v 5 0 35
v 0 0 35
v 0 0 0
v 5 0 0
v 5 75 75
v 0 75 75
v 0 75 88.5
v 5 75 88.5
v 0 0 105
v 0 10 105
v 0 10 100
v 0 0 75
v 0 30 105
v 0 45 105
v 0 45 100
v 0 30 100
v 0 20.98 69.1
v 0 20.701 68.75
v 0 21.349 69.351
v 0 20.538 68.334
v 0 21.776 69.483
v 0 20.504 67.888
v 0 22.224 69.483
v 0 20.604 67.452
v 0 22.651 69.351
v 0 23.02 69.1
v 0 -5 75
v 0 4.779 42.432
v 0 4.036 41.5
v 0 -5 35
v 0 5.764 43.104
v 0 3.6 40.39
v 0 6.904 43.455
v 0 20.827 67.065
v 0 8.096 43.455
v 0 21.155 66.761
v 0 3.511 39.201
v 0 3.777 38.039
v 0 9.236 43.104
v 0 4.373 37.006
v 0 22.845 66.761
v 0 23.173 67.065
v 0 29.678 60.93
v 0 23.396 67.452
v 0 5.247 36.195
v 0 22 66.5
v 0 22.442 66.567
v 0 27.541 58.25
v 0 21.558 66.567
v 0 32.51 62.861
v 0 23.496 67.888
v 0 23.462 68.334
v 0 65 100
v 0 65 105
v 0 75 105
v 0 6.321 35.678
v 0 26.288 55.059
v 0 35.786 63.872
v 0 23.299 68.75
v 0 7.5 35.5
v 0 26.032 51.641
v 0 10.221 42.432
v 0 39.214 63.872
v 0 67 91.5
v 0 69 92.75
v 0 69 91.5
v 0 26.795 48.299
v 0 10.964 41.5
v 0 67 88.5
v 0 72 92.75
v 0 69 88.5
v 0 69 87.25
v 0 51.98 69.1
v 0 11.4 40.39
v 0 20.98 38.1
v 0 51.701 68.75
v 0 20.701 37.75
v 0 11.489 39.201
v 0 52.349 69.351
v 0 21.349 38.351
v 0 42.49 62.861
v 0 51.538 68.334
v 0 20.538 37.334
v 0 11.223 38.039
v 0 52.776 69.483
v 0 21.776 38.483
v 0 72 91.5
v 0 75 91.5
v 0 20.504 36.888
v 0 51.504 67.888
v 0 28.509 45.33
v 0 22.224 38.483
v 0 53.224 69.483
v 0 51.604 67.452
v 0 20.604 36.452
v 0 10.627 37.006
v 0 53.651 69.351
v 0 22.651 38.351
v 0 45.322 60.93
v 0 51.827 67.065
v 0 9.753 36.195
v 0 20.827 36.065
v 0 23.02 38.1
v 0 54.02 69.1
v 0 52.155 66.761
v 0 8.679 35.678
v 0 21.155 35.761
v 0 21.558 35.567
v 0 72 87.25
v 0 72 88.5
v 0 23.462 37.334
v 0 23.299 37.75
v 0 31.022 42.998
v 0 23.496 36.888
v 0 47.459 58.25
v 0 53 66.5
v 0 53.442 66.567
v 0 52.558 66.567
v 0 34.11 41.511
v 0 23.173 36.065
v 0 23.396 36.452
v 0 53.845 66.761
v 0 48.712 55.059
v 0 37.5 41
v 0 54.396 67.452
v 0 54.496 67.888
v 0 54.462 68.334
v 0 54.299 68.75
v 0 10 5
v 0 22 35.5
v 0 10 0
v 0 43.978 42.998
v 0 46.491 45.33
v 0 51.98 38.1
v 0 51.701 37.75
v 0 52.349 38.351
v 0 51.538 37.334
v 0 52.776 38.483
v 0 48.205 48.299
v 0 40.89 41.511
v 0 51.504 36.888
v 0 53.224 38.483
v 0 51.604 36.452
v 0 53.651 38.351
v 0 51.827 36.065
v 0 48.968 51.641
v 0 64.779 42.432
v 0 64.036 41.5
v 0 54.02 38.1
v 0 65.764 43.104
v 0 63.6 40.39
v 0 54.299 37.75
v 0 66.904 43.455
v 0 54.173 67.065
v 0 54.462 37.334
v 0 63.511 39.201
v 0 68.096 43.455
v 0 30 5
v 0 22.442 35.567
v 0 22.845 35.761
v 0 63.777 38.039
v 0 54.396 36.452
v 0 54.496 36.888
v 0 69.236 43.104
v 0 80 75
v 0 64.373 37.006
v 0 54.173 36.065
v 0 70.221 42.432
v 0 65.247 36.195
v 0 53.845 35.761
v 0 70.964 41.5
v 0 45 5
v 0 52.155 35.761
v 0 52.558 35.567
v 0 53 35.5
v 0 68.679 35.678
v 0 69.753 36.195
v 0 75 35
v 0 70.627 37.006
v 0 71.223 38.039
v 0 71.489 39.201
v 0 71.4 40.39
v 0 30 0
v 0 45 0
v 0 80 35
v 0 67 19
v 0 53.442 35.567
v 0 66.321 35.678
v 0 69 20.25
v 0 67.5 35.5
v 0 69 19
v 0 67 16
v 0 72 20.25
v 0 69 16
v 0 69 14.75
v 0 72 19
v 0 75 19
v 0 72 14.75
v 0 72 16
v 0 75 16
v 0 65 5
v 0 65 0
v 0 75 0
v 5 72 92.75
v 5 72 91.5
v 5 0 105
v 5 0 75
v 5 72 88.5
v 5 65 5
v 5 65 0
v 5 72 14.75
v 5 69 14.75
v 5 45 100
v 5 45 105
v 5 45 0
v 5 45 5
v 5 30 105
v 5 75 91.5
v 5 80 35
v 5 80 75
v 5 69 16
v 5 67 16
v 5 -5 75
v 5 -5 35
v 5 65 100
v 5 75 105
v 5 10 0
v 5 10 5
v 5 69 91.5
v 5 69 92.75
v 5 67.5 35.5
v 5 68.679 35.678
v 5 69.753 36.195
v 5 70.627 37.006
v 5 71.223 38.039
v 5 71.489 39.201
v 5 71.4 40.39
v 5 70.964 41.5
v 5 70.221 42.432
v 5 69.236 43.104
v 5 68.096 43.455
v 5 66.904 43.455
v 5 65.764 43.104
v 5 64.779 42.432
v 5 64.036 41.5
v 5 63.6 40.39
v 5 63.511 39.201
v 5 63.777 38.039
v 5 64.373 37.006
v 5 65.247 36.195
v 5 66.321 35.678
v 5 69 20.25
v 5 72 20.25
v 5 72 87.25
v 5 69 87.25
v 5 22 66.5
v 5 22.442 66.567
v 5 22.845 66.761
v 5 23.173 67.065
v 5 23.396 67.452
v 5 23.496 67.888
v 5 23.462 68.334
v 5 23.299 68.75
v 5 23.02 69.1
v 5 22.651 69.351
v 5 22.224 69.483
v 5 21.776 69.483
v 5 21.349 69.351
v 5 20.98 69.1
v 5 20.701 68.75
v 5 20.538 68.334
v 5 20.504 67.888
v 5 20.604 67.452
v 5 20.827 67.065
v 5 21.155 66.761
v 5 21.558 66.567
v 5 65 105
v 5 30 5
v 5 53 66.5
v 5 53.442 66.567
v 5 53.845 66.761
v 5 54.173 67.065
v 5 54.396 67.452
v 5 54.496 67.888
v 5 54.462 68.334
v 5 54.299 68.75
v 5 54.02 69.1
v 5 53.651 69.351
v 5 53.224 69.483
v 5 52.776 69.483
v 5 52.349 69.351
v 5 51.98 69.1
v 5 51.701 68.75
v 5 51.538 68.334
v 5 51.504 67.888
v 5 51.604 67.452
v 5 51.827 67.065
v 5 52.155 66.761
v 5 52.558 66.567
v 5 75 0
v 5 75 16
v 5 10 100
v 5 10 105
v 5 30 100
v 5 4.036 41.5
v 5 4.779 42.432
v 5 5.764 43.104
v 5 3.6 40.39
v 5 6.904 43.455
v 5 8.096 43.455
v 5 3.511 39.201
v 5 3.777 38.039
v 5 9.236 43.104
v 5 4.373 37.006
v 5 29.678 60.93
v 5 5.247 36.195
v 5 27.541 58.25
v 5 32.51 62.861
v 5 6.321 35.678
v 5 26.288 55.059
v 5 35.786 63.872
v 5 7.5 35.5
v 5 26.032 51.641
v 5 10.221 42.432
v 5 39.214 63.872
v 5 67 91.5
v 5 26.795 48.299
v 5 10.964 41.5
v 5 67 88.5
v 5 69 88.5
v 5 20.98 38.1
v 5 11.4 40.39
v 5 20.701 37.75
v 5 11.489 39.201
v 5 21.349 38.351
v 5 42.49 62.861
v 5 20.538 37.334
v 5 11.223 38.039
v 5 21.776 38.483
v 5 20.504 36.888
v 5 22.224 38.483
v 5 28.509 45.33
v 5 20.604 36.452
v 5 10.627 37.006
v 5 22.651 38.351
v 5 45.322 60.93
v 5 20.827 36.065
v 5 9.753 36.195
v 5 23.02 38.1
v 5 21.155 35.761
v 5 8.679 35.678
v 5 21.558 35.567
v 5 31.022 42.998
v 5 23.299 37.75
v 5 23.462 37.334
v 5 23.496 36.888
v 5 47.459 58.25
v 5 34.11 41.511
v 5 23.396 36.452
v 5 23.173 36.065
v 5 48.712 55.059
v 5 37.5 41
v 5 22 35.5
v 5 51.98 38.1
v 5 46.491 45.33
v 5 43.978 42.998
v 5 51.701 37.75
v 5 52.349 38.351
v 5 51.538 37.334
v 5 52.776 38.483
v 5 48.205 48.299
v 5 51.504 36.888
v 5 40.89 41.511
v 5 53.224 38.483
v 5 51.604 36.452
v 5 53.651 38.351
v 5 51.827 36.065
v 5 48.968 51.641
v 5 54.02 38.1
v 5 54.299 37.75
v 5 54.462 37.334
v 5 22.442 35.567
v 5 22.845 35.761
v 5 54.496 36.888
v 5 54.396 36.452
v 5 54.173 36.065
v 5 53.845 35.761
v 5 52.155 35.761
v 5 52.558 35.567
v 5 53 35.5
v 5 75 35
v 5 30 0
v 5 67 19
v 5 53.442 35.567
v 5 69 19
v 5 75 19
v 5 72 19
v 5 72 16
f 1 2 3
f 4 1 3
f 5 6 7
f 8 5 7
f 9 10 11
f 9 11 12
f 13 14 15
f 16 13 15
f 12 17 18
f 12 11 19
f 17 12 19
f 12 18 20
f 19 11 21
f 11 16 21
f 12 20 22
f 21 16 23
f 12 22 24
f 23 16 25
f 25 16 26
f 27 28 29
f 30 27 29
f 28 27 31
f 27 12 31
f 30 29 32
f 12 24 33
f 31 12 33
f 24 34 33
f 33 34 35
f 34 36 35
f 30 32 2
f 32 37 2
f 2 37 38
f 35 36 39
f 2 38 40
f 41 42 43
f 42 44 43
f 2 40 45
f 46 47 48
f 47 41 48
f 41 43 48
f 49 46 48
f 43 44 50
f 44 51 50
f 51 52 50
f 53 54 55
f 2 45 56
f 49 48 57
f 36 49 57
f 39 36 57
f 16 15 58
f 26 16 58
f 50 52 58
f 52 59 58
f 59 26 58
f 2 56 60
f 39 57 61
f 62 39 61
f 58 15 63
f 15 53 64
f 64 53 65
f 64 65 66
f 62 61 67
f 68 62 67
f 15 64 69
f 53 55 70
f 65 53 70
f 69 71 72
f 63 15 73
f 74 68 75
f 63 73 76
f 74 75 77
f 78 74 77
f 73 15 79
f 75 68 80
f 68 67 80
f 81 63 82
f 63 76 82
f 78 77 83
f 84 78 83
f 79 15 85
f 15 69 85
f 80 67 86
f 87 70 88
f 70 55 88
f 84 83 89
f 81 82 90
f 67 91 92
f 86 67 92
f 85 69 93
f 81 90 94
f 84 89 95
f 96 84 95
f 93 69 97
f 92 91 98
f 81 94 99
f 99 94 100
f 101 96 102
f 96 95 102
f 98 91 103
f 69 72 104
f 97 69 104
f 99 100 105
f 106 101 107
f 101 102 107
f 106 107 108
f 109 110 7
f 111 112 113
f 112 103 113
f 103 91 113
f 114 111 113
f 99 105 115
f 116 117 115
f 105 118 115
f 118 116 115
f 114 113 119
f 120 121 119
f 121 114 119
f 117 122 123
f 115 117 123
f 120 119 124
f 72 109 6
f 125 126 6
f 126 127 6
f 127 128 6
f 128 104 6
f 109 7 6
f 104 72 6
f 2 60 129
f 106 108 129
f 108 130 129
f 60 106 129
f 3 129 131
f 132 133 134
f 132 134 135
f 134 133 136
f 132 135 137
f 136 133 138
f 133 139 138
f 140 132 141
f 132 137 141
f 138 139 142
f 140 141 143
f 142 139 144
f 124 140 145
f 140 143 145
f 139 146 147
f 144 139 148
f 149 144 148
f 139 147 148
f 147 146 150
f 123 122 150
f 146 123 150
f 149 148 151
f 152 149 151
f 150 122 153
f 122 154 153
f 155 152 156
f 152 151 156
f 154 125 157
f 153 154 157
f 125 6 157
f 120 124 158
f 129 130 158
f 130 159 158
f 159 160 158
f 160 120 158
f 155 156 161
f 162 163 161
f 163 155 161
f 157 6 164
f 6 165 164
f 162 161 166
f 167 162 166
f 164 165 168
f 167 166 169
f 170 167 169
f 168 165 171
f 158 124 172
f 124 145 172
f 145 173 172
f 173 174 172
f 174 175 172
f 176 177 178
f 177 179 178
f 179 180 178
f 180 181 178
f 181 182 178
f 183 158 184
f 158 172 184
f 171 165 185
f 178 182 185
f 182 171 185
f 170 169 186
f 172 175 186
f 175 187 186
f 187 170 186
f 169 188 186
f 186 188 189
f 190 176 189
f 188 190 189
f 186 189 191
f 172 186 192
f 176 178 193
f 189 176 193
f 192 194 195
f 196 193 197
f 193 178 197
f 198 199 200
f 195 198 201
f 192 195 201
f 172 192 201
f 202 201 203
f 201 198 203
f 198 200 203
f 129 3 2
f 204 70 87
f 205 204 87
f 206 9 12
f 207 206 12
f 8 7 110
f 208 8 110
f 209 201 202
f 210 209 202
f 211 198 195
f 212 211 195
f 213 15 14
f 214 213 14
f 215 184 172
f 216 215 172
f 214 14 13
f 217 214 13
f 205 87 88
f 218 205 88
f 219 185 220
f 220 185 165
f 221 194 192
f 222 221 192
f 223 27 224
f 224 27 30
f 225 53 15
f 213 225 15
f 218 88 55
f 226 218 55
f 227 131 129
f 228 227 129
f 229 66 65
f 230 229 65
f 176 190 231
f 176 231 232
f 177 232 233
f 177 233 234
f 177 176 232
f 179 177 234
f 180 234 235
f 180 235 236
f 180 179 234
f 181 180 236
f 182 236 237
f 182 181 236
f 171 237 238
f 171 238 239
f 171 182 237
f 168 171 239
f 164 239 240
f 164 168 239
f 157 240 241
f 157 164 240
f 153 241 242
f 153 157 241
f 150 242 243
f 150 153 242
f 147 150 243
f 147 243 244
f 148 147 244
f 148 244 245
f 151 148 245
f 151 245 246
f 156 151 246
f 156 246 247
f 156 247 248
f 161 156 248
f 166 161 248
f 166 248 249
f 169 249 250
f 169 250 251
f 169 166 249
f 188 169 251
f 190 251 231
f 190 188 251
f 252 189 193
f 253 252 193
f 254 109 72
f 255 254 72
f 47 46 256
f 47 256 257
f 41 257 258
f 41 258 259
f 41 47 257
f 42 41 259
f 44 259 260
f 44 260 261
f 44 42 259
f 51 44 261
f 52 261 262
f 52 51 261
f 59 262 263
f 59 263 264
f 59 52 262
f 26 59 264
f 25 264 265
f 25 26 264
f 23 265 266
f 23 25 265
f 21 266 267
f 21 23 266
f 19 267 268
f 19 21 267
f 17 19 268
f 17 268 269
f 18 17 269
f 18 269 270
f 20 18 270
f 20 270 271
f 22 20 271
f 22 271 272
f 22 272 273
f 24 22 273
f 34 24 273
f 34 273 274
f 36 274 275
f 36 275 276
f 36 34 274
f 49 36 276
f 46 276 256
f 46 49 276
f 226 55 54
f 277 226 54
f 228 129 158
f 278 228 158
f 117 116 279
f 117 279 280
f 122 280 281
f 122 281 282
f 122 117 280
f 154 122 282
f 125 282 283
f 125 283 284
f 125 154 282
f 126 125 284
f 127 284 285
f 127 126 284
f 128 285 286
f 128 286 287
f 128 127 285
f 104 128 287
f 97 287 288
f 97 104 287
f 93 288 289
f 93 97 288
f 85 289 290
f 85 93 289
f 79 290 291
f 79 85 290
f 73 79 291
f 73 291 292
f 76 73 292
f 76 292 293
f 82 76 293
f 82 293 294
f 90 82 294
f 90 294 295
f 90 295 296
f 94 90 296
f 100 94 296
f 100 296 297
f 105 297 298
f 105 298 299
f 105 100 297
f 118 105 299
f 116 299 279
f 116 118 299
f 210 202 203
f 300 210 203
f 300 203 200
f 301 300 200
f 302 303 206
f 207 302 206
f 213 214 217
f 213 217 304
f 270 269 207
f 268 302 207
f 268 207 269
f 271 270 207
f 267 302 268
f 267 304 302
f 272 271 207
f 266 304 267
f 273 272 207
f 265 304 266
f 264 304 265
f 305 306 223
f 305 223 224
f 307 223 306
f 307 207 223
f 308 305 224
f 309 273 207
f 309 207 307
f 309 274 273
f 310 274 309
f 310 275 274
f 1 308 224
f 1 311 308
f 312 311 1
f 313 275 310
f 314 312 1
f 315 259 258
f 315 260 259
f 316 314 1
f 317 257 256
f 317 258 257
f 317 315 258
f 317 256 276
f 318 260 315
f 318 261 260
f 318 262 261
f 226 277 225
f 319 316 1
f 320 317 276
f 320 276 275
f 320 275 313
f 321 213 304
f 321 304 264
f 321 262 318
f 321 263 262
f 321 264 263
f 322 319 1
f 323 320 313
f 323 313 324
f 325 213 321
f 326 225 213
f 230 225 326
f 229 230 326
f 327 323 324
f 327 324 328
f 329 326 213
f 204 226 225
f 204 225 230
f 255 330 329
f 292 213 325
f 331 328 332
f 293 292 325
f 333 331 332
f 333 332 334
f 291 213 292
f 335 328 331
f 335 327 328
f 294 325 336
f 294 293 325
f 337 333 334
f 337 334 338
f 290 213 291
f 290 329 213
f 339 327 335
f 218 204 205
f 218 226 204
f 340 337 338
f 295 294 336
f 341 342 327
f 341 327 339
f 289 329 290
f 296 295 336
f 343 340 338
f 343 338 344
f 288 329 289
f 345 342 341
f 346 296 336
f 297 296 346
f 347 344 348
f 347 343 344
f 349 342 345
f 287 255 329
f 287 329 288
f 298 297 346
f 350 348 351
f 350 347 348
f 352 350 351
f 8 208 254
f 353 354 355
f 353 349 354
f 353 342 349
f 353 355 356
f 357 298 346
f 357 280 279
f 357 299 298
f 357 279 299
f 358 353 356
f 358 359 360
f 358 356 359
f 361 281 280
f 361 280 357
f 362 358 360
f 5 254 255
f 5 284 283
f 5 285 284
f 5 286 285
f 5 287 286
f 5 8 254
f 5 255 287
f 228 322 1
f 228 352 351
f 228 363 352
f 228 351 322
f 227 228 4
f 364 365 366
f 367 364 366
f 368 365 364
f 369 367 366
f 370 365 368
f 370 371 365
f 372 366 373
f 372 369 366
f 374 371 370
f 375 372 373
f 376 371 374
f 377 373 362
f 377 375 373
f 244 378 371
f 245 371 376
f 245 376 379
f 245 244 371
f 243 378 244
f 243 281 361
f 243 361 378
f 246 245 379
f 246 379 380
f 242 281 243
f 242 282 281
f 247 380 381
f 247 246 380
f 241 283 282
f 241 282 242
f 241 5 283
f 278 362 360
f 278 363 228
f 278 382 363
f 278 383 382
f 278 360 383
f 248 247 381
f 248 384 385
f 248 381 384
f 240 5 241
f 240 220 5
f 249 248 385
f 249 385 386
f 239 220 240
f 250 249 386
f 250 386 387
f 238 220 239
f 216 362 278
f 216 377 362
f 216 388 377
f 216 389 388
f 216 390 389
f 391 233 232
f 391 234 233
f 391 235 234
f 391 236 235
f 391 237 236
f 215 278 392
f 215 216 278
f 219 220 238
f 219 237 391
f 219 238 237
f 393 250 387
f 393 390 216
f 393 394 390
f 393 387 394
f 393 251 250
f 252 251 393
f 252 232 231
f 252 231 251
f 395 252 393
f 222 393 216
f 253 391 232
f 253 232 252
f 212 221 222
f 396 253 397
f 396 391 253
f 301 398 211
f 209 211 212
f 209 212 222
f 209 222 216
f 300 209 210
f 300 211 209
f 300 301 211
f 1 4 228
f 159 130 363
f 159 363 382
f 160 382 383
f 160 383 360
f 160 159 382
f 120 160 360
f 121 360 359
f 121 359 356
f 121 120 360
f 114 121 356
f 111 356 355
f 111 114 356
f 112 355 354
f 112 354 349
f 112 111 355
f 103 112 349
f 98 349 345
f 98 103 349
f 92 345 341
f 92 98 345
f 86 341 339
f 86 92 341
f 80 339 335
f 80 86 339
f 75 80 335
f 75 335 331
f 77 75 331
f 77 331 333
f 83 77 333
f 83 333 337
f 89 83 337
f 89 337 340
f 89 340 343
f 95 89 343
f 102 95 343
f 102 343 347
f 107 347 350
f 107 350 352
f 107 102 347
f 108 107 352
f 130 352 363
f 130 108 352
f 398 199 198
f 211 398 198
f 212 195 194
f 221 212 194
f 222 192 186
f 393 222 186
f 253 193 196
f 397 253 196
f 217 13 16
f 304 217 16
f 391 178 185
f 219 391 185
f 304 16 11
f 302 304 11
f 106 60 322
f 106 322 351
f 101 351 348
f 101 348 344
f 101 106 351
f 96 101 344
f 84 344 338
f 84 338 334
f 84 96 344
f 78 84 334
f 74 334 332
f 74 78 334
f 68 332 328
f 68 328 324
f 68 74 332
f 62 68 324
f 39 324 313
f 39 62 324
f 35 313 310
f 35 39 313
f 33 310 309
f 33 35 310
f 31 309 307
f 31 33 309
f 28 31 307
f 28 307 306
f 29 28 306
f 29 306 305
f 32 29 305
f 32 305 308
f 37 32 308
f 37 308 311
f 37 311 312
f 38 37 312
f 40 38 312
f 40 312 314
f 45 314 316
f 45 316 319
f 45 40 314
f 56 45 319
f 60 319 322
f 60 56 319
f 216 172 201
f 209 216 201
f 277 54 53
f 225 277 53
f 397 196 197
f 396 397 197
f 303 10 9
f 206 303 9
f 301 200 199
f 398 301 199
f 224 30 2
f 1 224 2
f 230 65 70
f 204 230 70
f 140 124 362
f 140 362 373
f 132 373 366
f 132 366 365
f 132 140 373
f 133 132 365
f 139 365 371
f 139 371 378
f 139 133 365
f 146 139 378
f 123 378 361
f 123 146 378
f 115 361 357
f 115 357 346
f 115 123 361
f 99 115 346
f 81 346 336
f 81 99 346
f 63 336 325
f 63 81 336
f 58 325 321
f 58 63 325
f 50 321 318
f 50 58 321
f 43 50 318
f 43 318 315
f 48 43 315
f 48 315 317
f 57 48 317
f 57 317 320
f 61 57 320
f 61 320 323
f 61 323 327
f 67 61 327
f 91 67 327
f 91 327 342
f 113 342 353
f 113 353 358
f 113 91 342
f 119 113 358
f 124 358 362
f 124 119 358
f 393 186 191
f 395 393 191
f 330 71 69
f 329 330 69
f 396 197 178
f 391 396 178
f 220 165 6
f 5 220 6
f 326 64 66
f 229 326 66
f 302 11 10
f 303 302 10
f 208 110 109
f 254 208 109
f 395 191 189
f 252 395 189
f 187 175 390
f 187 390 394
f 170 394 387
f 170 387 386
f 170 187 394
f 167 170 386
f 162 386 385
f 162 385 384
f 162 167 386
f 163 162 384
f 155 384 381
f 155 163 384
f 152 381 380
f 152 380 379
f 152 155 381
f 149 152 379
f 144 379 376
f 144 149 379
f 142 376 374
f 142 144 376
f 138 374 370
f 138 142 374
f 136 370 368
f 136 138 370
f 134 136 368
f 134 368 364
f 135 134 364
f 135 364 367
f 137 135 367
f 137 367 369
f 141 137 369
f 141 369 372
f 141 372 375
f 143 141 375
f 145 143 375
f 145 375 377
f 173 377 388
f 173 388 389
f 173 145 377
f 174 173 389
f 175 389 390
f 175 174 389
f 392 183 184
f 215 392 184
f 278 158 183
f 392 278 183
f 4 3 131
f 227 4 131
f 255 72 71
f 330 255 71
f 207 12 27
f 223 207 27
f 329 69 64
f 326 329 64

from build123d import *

# Parameters (mm, degrees)
SKETCH_1_R      = 11.5
SKETCH_1_R_2    = 1.5
SKETCH_1_R_3    = 4
EXTRUDE_1_DEPTH = 5


with BuildPart() as part:
    # 草图1 → 凸台-拉伸1 (new body)
    with BuildSketch(Plane(origin=(0, 0, 0), x_dir=(0, 0, -1), z_dir=(1, 0, 0))):
        Polygon((-75, 75), (-88.5, 75), (-88.5, 72), (-87.25, 72), (-87.25, 69), (-88.5, 69), (-88.5, 67), (-91.5, 67), (-91.5, 69), (-92.75, 69), (-92.75, 72), (-91.5, 72), (-91.5, 75), (-105, 75), (-105, 65), (-100, 65), (-100, 45), (-105, 45), (-105, 30), (-100, 30), (-100, 10), (-105, 10), (-105, 0), (-75, 0), (-75, -5), (-35, -5), (-35, 0), (0, 0), (0, 10), (-5, 10), (-5, 30), (0, 30), (0, 45), (-5, 45), (-5, 65), (0, 65), (0, 75), (-16, 75), (-16, 72), (-14.75, 72), (-14.75, 69), (-16, 69), (-16, 67), (-19, 67), (-19, 69), (-20.25, 69), (-20.25, 72), (-19, 72), (-19, 75), (-35, 75), (-35, 80), (-75, 80), align=None)
        with Locations((-52.5, 37.5)):
            Circle(SKETCH_1_R, mode=Mode.SUBTRACT)
        with Locations((-68, 53)):
            Circle(SKETCH_1_R_2, mode=Mode.SUBTRACT)
        with Locations((-37, 53)):
            Circle(SKETCH_1_R_2, mode=Mode.SUBTRACT)
        with Locations((-37, 22)):
            Circle(SKETCH_1_R_2, mode=Mode.SUBTRACT)
        with Locations((-68, 22)):
            Circle(SKETCH_1_R_2, mode=Mode.SUBTRACT)
        with Locations((-39.5, 67.5)):
            Circle(SKETCH_1_R_3, mode=Mode.SUBTRACT)
        with Locations((-39.5, 7.5)):
            Circle(SKETCH_1_R_3, mode=Mode.SUBTRACT)
    extrude(amount=EXTRUDE_1_DEPTH)


solid = part.part
